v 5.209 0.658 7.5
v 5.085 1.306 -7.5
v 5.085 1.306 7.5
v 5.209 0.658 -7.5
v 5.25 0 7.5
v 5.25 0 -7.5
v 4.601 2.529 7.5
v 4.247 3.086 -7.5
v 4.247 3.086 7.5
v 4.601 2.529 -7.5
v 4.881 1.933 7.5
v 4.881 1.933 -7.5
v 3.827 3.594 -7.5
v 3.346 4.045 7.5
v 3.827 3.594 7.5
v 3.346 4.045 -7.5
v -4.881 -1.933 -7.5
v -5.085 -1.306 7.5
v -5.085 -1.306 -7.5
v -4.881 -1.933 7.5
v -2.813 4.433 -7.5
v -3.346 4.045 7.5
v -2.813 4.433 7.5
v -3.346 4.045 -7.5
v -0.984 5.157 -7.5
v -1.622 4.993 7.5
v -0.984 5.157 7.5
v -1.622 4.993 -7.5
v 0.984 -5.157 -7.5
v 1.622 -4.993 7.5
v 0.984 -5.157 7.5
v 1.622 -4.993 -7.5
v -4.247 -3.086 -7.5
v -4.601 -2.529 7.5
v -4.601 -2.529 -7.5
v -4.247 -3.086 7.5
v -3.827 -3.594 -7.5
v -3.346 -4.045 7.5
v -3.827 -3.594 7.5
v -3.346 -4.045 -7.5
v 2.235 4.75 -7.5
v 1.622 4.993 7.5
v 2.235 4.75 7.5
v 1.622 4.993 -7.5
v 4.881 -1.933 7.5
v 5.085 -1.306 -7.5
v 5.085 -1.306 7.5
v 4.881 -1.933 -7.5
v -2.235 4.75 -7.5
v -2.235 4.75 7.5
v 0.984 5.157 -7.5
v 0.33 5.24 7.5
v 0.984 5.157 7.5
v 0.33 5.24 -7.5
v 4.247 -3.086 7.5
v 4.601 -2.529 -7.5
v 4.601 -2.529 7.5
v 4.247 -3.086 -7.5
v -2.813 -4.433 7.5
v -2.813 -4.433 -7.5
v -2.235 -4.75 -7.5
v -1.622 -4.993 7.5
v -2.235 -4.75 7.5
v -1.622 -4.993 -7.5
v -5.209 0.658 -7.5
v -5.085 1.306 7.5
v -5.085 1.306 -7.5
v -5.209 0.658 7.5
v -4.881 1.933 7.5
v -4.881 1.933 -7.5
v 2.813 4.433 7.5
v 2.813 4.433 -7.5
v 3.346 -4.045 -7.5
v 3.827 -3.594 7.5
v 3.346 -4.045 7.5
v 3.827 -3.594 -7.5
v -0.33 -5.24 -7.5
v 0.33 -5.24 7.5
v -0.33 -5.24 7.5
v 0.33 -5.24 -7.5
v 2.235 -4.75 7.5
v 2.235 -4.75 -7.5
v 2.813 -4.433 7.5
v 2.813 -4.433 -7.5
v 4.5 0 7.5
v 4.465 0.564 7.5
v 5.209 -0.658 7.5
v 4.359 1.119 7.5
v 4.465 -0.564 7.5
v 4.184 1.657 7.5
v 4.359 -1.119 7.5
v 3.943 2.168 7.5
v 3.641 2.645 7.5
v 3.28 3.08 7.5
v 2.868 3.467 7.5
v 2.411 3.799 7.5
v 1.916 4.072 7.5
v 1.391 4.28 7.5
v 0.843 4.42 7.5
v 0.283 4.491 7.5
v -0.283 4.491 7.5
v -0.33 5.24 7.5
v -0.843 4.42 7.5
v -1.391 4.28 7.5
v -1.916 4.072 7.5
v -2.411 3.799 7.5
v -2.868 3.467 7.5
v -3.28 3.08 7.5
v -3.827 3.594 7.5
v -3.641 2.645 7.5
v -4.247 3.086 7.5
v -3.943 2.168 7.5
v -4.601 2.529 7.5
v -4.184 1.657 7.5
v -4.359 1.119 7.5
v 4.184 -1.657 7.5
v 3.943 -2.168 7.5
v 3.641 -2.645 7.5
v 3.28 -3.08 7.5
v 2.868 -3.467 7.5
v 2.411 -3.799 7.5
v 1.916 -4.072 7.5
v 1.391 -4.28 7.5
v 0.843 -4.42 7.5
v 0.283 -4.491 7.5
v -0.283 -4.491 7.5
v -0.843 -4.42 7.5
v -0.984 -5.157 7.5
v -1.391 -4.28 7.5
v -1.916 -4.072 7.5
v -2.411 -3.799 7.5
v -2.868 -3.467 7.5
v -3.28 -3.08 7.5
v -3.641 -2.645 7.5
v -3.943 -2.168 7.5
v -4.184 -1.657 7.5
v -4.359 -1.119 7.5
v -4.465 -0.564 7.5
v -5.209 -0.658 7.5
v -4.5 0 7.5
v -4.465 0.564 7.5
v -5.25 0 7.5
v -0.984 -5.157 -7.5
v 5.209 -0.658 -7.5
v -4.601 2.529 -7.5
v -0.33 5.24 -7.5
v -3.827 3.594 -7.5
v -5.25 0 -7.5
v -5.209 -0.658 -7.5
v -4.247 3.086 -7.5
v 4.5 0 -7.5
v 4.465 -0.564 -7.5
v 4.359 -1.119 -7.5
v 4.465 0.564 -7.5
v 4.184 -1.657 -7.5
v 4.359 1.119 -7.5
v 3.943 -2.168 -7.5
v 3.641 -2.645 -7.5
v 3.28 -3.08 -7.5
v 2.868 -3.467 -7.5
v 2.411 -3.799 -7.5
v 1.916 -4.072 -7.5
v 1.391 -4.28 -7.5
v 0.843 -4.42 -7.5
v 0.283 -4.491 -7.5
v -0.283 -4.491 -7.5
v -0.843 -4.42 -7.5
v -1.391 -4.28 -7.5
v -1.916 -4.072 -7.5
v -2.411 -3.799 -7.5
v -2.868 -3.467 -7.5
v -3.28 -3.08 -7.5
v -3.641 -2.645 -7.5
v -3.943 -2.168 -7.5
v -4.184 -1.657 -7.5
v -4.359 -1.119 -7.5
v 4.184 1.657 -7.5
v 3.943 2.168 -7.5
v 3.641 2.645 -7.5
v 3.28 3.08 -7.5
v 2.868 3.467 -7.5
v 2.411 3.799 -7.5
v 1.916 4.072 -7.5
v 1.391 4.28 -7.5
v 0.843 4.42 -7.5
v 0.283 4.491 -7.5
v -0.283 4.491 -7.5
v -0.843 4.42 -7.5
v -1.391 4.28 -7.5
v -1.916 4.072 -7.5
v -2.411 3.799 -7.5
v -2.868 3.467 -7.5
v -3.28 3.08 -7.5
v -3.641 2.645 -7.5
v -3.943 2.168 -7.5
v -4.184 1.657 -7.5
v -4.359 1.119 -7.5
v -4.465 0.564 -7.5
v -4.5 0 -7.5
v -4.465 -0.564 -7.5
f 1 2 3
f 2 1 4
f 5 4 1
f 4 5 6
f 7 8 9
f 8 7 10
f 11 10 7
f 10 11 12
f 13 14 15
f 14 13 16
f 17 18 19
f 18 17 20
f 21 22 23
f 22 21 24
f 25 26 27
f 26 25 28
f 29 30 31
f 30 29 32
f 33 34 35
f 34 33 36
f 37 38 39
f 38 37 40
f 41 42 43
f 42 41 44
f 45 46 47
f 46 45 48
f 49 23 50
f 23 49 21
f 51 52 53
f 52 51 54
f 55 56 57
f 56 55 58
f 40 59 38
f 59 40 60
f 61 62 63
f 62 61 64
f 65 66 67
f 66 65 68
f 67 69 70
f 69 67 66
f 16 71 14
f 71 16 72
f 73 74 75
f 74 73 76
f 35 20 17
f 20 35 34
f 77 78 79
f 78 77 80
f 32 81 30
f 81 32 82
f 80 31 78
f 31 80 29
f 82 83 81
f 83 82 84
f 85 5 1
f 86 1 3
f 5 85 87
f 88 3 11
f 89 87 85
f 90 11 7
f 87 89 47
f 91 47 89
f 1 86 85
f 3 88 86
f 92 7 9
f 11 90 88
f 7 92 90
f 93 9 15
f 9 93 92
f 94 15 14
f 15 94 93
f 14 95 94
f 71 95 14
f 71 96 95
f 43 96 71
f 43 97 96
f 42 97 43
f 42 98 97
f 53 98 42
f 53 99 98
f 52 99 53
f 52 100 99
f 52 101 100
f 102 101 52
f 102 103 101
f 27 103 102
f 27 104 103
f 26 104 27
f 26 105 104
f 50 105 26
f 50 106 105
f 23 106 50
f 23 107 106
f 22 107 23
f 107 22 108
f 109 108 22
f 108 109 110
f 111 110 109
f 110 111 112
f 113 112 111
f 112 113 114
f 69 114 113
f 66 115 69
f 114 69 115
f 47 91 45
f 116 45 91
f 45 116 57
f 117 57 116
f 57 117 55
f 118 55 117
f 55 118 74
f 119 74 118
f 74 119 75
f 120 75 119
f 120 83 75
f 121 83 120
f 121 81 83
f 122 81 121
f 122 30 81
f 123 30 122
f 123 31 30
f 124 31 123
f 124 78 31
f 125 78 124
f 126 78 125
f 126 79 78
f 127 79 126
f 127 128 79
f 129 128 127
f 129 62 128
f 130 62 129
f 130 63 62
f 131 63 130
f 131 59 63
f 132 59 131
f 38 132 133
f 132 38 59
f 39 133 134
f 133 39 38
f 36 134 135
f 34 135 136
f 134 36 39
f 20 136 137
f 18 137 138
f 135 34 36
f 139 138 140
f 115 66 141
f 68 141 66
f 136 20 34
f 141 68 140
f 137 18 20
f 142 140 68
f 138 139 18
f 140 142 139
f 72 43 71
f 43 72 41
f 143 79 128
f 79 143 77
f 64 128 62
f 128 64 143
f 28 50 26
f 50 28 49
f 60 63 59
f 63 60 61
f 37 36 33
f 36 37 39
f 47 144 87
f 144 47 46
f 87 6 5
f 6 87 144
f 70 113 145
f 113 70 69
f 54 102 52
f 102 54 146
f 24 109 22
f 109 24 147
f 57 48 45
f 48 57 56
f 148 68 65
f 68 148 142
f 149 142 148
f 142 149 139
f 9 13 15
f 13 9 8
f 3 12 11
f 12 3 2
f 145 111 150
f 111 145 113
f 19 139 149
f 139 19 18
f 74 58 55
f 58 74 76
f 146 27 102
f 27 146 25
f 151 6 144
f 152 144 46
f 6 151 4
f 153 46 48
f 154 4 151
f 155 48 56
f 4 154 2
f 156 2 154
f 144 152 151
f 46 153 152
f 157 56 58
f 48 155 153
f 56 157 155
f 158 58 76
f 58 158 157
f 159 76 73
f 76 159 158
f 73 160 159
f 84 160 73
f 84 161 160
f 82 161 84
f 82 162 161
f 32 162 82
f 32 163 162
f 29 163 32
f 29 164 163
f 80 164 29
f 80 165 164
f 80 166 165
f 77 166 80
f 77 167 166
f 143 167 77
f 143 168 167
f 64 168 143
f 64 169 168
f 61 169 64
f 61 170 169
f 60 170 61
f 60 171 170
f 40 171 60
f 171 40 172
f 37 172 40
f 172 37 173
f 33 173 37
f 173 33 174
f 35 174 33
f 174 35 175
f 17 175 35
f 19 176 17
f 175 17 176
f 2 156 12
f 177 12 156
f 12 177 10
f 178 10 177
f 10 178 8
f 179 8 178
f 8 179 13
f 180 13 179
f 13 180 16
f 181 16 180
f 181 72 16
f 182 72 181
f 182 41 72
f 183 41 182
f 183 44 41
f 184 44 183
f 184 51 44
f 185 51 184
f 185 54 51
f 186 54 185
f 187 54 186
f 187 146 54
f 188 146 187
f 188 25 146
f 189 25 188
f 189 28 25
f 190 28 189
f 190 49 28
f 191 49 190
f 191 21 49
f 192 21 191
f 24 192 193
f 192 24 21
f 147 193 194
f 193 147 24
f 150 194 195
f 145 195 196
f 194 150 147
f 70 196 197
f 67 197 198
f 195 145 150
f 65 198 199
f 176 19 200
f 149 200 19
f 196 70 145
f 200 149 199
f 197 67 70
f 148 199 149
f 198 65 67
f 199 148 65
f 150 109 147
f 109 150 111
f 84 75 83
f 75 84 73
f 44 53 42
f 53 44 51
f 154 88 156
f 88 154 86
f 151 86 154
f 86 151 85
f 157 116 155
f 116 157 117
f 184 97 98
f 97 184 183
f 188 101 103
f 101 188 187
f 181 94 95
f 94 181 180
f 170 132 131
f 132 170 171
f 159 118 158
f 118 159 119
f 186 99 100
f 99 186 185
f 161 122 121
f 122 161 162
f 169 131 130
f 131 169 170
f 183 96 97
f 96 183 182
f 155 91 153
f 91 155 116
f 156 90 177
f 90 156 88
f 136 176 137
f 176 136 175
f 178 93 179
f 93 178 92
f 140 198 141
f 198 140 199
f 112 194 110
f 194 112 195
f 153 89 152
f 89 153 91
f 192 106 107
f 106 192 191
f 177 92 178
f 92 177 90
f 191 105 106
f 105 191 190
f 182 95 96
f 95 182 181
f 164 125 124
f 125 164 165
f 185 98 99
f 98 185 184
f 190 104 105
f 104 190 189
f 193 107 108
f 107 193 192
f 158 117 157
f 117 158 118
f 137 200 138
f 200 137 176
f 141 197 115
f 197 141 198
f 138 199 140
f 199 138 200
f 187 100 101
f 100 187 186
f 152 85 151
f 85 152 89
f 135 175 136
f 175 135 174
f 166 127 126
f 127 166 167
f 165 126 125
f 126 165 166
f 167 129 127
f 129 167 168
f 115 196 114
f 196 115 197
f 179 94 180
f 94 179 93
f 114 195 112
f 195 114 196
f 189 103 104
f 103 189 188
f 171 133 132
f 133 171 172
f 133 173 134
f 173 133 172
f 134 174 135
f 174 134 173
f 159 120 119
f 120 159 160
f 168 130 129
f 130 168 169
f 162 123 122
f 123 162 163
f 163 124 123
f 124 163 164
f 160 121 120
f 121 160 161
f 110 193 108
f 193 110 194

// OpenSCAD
$fn = 50;


difference() {
	union() {
		translate(v = [0, 0, -7.5000000000]) {
			cylinder(h = 15, r = 5.2500000000);
		}
	}
	union() {
		translate(v = [0, 0, -100.0000000000]) {
			cylinder(h = 200, r = 4.5000000000);
		}
	}
}
